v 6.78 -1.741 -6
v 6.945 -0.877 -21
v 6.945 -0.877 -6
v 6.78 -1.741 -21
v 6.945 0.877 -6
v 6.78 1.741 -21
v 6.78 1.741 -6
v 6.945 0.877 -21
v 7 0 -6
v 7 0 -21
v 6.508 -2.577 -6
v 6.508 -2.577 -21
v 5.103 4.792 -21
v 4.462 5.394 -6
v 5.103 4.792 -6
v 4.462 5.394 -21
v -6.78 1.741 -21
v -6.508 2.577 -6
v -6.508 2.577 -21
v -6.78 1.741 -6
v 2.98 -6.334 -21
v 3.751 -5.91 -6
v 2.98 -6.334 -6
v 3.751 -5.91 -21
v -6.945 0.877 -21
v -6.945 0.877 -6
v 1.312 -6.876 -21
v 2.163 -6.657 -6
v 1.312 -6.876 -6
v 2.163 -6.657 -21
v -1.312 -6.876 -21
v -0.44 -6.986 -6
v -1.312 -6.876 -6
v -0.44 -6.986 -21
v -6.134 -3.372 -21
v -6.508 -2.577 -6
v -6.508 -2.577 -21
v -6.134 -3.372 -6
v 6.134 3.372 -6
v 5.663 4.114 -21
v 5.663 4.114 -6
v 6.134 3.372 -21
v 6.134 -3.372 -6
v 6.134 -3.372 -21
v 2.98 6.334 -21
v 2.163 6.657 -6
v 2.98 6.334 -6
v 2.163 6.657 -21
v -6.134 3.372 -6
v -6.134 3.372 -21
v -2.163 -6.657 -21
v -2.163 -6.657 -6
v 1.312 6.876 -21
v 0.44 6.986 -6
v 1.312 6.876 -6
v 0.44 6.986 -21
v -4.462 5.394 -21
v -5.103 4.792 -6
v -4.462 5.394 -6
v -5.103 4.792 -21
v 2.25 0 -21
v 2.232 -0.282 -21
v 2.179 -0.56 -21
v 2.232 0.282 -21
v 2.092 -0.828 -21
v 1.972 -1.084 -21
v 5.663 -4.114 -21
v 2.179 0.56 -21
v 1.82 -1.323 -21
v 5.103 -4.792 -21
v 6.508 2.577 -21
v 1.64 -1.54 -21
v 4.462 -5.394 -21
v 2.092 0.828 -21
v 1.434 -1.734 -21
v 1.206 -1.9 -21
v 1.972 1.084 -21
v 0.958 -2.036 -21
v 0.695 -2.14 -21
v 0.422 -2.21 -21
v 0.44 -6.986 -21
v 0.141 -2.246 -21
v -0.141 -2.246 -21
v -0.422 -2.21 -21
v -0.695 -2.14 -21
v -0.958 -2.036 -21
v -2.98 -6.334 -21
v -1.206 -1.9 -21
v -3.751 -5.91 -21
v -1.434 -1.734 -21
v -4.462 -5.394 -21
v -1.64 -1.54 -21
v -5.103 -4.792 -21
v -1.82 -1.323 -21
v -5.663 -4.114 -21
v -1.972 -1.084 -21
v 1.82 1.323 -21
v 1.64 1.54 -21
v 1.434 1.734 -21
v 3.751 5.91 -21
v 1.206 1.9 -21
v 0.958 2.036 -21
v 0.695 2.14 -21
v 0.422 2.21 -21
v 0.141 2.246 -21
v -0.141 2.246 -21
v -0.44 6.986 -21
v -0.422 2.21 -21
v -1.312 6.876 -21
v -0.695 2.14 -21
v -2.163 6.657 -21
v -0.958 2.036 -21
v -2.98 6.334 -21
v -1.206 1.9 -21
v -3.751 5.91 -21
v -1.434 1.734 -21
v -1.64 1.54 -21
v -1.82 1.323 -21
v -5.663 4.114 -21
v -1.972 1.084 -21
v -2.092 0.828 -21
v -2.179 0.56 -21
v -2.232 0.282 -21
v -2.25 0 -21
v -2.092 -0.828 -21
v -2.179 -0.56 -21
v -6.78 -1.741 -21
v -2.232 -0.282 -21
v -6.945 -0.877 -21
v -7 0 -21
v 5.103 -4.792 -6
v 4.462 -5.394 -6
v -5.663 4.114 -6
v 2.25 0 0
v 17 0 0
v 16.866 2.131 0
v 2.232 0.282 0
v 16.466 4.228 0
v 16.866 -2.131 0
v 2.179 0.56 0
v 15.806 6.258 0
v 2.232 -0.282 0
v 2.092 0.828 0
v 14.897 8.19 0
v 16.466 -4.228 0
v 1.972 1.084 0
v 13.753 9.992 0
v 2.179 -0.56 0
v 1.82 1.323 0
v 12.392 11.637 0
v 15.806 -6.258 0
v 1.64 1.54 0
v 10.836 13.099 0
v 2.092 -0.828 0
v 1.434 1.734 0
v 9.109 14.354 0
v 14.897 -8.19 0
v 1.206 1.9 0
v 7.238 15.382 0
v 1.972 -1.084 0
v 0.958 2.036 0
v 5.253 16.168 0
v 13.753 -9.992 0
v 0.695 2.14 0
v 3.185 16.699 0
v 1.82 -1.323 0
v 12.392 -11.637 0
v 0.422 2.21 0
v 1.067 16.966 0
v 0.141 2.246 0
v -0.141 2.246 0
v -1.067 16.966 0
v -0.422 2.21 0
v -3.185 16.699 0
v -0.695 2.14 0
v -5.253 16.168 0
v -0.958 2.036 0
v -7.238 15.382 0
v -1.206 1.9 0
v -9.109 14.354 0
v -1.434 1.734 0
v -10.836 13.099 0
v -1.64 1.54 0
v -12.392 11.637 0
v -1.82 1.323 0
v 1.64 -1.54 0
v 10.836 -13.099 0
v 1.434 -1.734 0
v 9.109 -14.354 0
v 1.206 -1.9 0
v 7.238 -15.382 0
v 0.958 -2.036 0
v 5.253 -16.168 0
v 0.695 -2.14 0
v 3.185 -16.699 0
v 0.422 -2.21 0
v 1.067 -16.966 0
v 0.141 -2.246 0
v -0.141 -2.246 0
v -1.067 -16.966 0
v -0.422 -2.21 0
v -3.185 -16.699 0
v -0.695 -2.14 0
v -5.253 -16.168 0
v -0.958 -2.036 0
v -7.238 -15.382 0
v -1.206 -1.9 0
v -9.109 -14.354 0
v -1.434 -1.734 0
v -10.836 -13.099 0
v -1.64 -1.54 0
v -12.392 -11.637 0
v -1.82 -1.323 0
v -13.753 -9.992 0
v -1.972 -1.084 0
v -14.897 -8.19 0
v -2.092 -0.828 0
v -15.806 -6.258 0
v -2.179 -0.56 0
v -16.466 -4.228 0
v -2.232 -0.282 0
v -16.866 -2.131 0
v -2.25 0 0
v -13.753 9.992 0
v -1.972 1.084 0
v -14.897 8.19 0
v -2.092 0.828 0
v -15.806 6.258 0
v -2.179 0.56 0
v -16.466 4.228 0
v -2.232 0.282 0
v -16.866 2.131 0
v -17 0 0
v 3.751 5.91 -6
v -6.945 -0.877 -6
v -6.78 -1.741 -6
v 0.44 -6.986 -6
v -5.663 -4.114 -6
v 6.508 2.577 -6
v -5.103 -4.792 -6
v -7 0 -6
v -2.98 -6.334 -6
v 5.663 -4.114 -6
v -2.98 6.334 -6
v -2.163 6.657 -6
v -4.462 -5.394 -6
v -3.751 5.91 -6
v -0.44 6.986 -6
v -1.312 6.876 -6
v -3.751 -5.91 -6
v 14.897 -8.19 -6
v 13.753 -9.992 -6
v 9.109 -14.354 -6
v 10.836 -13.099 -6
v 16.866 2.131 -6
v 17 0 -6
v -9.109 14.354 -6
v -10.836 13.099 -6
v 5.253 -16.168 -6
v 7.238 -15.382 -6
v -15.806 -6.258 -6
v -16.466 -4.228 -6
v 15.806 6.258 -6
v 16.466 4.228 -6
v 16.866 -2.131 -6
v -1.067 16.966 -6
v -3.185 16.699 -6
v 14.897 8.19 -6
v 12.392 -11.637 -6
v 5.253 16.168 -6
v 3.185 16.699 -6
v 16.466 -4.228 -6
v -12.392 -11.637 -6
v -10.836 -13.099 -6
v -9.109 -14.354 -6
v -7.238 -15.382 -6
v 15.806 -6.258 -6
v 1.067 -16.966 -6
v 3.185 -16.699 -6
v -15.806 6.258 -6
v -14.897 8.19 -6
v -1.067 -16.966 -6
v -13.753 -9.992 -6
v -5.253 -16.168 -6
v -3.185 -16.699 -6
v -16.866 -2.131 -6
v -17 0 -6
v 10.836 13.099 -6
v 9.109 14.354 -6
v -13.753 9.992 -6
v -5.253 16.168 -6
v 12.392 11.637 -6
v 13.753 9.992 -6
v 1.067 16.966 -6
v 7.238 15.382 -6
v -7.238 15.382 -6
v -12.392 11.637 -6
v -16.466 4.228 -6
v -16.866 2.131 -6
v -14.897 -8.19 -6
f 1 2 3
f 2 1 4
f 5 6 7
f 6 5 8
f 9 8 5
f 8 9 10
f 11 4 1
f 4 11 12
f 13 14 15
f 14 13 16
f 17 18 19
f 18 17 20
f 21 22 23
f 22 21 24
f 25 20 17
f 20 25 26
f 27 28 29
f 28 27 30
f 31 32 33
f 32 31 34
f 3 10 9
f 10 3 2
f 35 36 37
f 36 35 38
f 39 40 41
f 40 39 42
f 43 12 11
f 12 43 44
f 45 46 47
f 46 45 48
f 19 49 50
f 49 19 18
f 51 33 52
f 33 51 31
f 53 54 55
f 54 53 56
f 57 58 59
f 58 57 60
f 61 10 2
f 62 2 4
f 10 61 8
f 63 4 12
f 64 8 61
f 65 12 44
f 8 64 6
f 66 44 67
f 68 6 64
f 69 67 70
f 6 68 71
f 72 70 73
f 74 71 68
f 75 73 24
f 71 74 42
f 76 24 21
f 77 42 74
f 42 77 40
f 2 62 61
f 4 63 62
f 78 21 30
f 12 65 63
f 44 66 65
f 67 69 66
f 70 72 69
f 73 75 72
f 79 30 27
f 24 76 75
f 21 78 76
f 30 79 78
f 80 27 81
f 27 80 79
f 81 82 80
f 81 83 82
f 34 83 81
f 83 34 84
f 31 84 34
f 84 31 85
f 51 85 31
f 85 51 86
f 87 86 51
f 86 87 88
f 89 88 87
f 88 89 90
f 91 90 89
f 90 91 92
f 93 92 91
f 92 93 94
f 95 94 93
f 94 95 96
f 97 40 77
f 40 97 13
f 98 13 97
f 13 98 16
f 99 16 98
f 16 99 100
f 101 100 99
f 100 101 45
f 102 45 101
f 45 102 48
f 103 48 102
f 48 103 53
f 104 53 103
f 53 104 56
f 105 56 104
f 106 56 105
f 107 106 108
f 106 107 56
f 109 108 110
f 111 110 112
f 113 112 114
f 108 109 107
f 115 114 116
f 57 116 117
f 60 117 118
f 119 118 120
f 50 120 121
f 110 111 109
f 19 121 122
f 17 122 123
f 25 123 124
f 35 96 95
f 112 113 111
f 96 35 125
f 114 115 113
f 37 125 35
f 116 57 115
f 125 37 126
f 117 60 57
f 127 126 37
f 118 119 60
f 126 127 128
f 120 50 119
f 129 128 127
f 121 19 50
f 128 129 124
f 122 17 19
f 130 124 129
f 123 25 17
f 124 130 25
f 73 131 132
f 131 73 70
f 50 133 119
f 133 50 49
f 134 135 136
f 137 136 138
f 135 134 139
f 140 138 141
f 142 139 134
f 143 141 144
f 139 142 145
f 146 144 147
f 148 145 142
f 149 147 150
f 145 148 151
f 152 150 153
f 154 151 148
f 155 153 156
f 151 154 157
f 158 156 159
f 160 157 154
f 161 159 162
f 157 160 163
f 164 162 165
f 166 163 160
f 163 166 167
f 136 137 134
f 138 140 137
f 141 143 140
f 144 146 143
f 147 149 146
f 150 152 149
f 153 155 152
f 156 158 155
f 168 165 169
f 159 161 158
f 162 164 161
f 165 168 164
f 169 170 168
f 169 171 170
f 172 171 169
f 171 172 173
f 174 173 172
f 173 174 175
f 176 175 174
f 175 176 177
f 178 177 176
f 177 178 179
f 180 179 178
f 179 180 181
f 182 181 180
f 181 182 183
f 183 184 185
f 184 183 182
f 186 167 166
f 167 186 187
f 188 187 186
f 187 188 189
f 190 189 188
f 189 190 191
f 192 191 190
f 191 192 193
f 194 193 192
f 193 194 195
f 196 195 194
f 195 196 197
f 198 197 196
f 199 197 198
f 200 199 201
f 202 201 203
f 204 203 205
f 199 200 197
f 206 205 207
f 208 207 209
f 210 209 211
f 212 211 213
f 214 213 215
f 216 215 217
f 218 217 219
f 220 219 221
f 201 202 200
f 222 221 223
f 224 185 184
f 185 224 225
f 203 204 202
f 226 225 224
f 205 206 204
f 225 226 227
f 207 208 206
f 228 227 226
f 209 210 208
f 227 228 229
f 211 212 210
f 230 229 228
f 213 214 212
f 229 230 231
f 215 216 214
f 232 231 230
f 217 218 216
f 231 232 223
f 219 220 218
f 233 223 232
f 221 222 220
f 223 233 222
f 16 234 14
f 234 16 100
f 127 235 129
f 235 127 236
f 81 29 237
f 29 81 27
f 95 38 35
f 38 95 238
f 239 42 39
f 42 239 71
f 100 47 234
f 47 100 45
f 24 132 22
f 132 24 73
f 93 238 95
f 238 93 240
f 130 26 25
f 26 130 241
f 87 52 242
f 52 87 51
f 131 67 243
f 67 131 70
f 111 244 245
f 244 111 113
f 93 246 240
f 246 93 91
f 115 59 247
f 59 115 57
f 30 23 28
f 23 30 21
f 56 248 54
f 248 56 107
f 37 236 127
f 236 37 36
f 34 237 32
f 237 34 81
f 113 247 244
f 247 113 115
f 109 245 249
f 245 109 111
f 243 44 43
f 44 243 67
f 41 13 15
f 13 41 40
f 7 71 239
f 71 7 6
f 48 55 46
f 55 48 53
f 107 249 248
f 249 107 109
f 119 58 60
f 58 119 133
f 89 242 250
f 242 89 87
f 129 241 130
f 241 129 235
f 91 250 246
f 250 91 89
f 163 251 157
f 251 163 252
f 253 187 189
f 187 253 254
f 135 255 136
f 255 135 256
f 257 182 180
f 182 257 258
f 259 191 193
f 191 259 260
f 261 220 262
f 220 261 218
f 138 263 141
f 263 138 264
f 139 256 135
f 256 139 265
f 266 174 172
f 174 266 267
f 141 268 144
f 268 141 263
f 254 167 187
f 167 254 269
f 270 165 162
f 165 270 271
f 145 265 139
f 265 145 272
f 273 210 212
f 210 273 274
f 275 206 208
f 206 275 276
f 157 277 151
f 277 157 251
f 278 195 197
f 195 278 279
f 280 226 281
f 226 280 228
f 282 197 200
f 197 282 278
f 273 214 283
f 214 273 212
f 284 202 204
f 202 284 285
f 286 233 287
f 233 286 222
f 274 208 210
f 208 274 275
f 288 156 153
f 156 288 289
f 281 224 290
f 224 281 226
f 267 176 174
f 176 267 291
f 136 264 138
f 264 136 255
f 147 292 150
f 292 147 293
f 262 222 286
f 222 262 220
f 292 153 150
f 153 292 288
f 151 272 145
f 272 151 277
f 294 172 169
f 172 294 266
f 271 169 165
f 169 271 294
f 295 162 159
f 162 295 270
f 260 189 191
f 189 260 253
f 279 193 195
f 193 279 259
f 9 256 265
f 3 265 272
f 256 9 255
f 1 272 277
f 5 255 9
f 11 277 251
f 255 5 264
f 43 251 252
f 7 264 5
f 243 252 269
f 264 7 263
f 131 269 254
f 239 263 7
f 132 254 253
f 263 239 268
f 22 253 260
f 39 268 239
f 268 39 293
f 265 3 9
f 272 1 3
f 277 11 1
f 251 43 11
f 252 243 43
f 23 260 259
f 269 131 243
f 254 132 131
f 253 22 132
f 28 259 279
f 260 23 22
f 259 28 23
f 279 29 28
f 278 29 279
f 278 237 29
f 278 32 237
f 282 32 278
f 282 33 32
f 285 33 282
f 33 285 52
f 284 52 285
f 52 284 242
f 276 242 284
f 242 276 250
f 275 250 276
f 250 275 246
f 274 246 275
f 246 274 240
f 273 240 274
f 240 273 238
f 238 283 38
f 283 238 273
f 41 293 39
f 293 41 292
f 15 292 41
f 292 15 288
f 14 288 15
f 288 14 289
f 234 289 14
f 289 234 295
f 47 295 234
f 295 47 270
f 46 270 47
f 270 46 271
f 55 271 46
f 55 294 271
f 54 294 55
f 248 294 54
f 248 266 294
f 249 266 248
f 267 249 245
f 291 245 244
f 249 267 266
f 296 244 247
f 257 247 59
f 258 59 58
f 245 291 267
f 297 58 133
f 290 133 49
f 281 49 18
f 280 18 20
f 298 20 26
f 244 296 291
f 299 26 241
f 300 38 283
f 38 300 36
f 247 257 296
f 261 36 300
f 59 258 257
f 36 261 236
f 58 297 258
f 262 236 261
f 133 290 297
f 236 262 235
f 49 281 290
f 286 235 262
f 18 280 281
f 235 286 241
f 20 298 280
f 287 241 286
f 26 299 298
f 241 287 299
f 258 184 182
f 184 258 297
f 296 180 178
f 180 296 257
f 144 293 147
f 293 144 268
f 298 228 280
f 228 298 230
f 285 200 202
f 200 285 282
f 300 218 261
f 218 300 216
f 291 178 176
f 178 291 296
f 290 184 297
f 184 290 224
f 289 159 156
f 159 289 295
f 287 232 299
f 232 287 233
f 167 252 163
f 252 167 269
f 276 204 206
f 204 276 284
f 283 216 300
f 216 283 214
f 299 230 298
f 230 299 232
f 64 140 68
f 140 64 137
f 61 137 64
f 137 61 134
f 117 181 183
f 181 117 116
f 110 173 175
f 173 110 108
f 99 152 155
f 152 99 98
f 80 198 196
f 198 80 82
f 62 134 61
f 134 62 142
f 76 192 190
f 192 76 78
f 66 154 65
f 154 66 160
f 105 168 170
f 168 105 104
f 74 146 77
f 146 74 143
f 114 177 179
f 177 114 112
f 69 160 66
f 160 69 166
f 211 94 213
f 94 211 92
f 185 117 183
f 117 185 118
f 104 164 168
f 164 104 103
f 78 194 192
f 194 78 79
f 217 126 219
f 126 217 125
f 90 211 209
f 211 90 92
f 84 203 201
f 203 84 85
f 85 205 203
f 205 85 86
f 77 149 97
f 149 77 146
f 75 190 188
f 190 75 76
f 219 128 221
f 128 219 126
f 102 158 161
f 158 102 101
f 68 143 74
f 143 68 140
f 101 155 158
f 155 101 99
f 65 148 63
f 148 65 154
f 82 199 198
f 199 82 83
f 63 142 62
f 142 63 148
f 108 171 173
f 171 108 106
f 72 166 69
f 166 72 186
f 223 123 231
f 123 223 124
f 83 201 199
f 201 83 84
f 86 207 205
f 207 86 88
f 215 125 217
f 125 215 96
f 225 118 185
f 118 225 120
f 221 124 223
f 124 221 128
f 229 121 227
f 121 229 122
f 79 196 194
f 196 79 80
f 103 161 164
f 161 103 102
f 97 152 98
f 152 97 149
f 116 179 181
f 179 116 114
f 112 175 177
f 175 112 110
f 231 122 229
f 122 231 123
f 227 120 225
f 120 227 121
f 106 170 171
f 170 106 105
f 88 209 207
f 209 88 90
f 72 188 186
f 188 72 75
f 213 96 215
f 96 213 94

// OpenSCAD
$fn = 50;


difference() {
	union() {
		translate(v = [0, 0, -21.0000000000]) {
			cylinder(h = 21, r = 7.0000000000);
		}
		translate(v = [0, 0, -6.0000000000]) {
			cylinder(h = 6, r = 17.0000000000);
		}
	}
	union() {
		#translate(v = [0, 0, -21]) {
			cylinder(h = 21, r = 2.2500000000);
		}
	}
}
